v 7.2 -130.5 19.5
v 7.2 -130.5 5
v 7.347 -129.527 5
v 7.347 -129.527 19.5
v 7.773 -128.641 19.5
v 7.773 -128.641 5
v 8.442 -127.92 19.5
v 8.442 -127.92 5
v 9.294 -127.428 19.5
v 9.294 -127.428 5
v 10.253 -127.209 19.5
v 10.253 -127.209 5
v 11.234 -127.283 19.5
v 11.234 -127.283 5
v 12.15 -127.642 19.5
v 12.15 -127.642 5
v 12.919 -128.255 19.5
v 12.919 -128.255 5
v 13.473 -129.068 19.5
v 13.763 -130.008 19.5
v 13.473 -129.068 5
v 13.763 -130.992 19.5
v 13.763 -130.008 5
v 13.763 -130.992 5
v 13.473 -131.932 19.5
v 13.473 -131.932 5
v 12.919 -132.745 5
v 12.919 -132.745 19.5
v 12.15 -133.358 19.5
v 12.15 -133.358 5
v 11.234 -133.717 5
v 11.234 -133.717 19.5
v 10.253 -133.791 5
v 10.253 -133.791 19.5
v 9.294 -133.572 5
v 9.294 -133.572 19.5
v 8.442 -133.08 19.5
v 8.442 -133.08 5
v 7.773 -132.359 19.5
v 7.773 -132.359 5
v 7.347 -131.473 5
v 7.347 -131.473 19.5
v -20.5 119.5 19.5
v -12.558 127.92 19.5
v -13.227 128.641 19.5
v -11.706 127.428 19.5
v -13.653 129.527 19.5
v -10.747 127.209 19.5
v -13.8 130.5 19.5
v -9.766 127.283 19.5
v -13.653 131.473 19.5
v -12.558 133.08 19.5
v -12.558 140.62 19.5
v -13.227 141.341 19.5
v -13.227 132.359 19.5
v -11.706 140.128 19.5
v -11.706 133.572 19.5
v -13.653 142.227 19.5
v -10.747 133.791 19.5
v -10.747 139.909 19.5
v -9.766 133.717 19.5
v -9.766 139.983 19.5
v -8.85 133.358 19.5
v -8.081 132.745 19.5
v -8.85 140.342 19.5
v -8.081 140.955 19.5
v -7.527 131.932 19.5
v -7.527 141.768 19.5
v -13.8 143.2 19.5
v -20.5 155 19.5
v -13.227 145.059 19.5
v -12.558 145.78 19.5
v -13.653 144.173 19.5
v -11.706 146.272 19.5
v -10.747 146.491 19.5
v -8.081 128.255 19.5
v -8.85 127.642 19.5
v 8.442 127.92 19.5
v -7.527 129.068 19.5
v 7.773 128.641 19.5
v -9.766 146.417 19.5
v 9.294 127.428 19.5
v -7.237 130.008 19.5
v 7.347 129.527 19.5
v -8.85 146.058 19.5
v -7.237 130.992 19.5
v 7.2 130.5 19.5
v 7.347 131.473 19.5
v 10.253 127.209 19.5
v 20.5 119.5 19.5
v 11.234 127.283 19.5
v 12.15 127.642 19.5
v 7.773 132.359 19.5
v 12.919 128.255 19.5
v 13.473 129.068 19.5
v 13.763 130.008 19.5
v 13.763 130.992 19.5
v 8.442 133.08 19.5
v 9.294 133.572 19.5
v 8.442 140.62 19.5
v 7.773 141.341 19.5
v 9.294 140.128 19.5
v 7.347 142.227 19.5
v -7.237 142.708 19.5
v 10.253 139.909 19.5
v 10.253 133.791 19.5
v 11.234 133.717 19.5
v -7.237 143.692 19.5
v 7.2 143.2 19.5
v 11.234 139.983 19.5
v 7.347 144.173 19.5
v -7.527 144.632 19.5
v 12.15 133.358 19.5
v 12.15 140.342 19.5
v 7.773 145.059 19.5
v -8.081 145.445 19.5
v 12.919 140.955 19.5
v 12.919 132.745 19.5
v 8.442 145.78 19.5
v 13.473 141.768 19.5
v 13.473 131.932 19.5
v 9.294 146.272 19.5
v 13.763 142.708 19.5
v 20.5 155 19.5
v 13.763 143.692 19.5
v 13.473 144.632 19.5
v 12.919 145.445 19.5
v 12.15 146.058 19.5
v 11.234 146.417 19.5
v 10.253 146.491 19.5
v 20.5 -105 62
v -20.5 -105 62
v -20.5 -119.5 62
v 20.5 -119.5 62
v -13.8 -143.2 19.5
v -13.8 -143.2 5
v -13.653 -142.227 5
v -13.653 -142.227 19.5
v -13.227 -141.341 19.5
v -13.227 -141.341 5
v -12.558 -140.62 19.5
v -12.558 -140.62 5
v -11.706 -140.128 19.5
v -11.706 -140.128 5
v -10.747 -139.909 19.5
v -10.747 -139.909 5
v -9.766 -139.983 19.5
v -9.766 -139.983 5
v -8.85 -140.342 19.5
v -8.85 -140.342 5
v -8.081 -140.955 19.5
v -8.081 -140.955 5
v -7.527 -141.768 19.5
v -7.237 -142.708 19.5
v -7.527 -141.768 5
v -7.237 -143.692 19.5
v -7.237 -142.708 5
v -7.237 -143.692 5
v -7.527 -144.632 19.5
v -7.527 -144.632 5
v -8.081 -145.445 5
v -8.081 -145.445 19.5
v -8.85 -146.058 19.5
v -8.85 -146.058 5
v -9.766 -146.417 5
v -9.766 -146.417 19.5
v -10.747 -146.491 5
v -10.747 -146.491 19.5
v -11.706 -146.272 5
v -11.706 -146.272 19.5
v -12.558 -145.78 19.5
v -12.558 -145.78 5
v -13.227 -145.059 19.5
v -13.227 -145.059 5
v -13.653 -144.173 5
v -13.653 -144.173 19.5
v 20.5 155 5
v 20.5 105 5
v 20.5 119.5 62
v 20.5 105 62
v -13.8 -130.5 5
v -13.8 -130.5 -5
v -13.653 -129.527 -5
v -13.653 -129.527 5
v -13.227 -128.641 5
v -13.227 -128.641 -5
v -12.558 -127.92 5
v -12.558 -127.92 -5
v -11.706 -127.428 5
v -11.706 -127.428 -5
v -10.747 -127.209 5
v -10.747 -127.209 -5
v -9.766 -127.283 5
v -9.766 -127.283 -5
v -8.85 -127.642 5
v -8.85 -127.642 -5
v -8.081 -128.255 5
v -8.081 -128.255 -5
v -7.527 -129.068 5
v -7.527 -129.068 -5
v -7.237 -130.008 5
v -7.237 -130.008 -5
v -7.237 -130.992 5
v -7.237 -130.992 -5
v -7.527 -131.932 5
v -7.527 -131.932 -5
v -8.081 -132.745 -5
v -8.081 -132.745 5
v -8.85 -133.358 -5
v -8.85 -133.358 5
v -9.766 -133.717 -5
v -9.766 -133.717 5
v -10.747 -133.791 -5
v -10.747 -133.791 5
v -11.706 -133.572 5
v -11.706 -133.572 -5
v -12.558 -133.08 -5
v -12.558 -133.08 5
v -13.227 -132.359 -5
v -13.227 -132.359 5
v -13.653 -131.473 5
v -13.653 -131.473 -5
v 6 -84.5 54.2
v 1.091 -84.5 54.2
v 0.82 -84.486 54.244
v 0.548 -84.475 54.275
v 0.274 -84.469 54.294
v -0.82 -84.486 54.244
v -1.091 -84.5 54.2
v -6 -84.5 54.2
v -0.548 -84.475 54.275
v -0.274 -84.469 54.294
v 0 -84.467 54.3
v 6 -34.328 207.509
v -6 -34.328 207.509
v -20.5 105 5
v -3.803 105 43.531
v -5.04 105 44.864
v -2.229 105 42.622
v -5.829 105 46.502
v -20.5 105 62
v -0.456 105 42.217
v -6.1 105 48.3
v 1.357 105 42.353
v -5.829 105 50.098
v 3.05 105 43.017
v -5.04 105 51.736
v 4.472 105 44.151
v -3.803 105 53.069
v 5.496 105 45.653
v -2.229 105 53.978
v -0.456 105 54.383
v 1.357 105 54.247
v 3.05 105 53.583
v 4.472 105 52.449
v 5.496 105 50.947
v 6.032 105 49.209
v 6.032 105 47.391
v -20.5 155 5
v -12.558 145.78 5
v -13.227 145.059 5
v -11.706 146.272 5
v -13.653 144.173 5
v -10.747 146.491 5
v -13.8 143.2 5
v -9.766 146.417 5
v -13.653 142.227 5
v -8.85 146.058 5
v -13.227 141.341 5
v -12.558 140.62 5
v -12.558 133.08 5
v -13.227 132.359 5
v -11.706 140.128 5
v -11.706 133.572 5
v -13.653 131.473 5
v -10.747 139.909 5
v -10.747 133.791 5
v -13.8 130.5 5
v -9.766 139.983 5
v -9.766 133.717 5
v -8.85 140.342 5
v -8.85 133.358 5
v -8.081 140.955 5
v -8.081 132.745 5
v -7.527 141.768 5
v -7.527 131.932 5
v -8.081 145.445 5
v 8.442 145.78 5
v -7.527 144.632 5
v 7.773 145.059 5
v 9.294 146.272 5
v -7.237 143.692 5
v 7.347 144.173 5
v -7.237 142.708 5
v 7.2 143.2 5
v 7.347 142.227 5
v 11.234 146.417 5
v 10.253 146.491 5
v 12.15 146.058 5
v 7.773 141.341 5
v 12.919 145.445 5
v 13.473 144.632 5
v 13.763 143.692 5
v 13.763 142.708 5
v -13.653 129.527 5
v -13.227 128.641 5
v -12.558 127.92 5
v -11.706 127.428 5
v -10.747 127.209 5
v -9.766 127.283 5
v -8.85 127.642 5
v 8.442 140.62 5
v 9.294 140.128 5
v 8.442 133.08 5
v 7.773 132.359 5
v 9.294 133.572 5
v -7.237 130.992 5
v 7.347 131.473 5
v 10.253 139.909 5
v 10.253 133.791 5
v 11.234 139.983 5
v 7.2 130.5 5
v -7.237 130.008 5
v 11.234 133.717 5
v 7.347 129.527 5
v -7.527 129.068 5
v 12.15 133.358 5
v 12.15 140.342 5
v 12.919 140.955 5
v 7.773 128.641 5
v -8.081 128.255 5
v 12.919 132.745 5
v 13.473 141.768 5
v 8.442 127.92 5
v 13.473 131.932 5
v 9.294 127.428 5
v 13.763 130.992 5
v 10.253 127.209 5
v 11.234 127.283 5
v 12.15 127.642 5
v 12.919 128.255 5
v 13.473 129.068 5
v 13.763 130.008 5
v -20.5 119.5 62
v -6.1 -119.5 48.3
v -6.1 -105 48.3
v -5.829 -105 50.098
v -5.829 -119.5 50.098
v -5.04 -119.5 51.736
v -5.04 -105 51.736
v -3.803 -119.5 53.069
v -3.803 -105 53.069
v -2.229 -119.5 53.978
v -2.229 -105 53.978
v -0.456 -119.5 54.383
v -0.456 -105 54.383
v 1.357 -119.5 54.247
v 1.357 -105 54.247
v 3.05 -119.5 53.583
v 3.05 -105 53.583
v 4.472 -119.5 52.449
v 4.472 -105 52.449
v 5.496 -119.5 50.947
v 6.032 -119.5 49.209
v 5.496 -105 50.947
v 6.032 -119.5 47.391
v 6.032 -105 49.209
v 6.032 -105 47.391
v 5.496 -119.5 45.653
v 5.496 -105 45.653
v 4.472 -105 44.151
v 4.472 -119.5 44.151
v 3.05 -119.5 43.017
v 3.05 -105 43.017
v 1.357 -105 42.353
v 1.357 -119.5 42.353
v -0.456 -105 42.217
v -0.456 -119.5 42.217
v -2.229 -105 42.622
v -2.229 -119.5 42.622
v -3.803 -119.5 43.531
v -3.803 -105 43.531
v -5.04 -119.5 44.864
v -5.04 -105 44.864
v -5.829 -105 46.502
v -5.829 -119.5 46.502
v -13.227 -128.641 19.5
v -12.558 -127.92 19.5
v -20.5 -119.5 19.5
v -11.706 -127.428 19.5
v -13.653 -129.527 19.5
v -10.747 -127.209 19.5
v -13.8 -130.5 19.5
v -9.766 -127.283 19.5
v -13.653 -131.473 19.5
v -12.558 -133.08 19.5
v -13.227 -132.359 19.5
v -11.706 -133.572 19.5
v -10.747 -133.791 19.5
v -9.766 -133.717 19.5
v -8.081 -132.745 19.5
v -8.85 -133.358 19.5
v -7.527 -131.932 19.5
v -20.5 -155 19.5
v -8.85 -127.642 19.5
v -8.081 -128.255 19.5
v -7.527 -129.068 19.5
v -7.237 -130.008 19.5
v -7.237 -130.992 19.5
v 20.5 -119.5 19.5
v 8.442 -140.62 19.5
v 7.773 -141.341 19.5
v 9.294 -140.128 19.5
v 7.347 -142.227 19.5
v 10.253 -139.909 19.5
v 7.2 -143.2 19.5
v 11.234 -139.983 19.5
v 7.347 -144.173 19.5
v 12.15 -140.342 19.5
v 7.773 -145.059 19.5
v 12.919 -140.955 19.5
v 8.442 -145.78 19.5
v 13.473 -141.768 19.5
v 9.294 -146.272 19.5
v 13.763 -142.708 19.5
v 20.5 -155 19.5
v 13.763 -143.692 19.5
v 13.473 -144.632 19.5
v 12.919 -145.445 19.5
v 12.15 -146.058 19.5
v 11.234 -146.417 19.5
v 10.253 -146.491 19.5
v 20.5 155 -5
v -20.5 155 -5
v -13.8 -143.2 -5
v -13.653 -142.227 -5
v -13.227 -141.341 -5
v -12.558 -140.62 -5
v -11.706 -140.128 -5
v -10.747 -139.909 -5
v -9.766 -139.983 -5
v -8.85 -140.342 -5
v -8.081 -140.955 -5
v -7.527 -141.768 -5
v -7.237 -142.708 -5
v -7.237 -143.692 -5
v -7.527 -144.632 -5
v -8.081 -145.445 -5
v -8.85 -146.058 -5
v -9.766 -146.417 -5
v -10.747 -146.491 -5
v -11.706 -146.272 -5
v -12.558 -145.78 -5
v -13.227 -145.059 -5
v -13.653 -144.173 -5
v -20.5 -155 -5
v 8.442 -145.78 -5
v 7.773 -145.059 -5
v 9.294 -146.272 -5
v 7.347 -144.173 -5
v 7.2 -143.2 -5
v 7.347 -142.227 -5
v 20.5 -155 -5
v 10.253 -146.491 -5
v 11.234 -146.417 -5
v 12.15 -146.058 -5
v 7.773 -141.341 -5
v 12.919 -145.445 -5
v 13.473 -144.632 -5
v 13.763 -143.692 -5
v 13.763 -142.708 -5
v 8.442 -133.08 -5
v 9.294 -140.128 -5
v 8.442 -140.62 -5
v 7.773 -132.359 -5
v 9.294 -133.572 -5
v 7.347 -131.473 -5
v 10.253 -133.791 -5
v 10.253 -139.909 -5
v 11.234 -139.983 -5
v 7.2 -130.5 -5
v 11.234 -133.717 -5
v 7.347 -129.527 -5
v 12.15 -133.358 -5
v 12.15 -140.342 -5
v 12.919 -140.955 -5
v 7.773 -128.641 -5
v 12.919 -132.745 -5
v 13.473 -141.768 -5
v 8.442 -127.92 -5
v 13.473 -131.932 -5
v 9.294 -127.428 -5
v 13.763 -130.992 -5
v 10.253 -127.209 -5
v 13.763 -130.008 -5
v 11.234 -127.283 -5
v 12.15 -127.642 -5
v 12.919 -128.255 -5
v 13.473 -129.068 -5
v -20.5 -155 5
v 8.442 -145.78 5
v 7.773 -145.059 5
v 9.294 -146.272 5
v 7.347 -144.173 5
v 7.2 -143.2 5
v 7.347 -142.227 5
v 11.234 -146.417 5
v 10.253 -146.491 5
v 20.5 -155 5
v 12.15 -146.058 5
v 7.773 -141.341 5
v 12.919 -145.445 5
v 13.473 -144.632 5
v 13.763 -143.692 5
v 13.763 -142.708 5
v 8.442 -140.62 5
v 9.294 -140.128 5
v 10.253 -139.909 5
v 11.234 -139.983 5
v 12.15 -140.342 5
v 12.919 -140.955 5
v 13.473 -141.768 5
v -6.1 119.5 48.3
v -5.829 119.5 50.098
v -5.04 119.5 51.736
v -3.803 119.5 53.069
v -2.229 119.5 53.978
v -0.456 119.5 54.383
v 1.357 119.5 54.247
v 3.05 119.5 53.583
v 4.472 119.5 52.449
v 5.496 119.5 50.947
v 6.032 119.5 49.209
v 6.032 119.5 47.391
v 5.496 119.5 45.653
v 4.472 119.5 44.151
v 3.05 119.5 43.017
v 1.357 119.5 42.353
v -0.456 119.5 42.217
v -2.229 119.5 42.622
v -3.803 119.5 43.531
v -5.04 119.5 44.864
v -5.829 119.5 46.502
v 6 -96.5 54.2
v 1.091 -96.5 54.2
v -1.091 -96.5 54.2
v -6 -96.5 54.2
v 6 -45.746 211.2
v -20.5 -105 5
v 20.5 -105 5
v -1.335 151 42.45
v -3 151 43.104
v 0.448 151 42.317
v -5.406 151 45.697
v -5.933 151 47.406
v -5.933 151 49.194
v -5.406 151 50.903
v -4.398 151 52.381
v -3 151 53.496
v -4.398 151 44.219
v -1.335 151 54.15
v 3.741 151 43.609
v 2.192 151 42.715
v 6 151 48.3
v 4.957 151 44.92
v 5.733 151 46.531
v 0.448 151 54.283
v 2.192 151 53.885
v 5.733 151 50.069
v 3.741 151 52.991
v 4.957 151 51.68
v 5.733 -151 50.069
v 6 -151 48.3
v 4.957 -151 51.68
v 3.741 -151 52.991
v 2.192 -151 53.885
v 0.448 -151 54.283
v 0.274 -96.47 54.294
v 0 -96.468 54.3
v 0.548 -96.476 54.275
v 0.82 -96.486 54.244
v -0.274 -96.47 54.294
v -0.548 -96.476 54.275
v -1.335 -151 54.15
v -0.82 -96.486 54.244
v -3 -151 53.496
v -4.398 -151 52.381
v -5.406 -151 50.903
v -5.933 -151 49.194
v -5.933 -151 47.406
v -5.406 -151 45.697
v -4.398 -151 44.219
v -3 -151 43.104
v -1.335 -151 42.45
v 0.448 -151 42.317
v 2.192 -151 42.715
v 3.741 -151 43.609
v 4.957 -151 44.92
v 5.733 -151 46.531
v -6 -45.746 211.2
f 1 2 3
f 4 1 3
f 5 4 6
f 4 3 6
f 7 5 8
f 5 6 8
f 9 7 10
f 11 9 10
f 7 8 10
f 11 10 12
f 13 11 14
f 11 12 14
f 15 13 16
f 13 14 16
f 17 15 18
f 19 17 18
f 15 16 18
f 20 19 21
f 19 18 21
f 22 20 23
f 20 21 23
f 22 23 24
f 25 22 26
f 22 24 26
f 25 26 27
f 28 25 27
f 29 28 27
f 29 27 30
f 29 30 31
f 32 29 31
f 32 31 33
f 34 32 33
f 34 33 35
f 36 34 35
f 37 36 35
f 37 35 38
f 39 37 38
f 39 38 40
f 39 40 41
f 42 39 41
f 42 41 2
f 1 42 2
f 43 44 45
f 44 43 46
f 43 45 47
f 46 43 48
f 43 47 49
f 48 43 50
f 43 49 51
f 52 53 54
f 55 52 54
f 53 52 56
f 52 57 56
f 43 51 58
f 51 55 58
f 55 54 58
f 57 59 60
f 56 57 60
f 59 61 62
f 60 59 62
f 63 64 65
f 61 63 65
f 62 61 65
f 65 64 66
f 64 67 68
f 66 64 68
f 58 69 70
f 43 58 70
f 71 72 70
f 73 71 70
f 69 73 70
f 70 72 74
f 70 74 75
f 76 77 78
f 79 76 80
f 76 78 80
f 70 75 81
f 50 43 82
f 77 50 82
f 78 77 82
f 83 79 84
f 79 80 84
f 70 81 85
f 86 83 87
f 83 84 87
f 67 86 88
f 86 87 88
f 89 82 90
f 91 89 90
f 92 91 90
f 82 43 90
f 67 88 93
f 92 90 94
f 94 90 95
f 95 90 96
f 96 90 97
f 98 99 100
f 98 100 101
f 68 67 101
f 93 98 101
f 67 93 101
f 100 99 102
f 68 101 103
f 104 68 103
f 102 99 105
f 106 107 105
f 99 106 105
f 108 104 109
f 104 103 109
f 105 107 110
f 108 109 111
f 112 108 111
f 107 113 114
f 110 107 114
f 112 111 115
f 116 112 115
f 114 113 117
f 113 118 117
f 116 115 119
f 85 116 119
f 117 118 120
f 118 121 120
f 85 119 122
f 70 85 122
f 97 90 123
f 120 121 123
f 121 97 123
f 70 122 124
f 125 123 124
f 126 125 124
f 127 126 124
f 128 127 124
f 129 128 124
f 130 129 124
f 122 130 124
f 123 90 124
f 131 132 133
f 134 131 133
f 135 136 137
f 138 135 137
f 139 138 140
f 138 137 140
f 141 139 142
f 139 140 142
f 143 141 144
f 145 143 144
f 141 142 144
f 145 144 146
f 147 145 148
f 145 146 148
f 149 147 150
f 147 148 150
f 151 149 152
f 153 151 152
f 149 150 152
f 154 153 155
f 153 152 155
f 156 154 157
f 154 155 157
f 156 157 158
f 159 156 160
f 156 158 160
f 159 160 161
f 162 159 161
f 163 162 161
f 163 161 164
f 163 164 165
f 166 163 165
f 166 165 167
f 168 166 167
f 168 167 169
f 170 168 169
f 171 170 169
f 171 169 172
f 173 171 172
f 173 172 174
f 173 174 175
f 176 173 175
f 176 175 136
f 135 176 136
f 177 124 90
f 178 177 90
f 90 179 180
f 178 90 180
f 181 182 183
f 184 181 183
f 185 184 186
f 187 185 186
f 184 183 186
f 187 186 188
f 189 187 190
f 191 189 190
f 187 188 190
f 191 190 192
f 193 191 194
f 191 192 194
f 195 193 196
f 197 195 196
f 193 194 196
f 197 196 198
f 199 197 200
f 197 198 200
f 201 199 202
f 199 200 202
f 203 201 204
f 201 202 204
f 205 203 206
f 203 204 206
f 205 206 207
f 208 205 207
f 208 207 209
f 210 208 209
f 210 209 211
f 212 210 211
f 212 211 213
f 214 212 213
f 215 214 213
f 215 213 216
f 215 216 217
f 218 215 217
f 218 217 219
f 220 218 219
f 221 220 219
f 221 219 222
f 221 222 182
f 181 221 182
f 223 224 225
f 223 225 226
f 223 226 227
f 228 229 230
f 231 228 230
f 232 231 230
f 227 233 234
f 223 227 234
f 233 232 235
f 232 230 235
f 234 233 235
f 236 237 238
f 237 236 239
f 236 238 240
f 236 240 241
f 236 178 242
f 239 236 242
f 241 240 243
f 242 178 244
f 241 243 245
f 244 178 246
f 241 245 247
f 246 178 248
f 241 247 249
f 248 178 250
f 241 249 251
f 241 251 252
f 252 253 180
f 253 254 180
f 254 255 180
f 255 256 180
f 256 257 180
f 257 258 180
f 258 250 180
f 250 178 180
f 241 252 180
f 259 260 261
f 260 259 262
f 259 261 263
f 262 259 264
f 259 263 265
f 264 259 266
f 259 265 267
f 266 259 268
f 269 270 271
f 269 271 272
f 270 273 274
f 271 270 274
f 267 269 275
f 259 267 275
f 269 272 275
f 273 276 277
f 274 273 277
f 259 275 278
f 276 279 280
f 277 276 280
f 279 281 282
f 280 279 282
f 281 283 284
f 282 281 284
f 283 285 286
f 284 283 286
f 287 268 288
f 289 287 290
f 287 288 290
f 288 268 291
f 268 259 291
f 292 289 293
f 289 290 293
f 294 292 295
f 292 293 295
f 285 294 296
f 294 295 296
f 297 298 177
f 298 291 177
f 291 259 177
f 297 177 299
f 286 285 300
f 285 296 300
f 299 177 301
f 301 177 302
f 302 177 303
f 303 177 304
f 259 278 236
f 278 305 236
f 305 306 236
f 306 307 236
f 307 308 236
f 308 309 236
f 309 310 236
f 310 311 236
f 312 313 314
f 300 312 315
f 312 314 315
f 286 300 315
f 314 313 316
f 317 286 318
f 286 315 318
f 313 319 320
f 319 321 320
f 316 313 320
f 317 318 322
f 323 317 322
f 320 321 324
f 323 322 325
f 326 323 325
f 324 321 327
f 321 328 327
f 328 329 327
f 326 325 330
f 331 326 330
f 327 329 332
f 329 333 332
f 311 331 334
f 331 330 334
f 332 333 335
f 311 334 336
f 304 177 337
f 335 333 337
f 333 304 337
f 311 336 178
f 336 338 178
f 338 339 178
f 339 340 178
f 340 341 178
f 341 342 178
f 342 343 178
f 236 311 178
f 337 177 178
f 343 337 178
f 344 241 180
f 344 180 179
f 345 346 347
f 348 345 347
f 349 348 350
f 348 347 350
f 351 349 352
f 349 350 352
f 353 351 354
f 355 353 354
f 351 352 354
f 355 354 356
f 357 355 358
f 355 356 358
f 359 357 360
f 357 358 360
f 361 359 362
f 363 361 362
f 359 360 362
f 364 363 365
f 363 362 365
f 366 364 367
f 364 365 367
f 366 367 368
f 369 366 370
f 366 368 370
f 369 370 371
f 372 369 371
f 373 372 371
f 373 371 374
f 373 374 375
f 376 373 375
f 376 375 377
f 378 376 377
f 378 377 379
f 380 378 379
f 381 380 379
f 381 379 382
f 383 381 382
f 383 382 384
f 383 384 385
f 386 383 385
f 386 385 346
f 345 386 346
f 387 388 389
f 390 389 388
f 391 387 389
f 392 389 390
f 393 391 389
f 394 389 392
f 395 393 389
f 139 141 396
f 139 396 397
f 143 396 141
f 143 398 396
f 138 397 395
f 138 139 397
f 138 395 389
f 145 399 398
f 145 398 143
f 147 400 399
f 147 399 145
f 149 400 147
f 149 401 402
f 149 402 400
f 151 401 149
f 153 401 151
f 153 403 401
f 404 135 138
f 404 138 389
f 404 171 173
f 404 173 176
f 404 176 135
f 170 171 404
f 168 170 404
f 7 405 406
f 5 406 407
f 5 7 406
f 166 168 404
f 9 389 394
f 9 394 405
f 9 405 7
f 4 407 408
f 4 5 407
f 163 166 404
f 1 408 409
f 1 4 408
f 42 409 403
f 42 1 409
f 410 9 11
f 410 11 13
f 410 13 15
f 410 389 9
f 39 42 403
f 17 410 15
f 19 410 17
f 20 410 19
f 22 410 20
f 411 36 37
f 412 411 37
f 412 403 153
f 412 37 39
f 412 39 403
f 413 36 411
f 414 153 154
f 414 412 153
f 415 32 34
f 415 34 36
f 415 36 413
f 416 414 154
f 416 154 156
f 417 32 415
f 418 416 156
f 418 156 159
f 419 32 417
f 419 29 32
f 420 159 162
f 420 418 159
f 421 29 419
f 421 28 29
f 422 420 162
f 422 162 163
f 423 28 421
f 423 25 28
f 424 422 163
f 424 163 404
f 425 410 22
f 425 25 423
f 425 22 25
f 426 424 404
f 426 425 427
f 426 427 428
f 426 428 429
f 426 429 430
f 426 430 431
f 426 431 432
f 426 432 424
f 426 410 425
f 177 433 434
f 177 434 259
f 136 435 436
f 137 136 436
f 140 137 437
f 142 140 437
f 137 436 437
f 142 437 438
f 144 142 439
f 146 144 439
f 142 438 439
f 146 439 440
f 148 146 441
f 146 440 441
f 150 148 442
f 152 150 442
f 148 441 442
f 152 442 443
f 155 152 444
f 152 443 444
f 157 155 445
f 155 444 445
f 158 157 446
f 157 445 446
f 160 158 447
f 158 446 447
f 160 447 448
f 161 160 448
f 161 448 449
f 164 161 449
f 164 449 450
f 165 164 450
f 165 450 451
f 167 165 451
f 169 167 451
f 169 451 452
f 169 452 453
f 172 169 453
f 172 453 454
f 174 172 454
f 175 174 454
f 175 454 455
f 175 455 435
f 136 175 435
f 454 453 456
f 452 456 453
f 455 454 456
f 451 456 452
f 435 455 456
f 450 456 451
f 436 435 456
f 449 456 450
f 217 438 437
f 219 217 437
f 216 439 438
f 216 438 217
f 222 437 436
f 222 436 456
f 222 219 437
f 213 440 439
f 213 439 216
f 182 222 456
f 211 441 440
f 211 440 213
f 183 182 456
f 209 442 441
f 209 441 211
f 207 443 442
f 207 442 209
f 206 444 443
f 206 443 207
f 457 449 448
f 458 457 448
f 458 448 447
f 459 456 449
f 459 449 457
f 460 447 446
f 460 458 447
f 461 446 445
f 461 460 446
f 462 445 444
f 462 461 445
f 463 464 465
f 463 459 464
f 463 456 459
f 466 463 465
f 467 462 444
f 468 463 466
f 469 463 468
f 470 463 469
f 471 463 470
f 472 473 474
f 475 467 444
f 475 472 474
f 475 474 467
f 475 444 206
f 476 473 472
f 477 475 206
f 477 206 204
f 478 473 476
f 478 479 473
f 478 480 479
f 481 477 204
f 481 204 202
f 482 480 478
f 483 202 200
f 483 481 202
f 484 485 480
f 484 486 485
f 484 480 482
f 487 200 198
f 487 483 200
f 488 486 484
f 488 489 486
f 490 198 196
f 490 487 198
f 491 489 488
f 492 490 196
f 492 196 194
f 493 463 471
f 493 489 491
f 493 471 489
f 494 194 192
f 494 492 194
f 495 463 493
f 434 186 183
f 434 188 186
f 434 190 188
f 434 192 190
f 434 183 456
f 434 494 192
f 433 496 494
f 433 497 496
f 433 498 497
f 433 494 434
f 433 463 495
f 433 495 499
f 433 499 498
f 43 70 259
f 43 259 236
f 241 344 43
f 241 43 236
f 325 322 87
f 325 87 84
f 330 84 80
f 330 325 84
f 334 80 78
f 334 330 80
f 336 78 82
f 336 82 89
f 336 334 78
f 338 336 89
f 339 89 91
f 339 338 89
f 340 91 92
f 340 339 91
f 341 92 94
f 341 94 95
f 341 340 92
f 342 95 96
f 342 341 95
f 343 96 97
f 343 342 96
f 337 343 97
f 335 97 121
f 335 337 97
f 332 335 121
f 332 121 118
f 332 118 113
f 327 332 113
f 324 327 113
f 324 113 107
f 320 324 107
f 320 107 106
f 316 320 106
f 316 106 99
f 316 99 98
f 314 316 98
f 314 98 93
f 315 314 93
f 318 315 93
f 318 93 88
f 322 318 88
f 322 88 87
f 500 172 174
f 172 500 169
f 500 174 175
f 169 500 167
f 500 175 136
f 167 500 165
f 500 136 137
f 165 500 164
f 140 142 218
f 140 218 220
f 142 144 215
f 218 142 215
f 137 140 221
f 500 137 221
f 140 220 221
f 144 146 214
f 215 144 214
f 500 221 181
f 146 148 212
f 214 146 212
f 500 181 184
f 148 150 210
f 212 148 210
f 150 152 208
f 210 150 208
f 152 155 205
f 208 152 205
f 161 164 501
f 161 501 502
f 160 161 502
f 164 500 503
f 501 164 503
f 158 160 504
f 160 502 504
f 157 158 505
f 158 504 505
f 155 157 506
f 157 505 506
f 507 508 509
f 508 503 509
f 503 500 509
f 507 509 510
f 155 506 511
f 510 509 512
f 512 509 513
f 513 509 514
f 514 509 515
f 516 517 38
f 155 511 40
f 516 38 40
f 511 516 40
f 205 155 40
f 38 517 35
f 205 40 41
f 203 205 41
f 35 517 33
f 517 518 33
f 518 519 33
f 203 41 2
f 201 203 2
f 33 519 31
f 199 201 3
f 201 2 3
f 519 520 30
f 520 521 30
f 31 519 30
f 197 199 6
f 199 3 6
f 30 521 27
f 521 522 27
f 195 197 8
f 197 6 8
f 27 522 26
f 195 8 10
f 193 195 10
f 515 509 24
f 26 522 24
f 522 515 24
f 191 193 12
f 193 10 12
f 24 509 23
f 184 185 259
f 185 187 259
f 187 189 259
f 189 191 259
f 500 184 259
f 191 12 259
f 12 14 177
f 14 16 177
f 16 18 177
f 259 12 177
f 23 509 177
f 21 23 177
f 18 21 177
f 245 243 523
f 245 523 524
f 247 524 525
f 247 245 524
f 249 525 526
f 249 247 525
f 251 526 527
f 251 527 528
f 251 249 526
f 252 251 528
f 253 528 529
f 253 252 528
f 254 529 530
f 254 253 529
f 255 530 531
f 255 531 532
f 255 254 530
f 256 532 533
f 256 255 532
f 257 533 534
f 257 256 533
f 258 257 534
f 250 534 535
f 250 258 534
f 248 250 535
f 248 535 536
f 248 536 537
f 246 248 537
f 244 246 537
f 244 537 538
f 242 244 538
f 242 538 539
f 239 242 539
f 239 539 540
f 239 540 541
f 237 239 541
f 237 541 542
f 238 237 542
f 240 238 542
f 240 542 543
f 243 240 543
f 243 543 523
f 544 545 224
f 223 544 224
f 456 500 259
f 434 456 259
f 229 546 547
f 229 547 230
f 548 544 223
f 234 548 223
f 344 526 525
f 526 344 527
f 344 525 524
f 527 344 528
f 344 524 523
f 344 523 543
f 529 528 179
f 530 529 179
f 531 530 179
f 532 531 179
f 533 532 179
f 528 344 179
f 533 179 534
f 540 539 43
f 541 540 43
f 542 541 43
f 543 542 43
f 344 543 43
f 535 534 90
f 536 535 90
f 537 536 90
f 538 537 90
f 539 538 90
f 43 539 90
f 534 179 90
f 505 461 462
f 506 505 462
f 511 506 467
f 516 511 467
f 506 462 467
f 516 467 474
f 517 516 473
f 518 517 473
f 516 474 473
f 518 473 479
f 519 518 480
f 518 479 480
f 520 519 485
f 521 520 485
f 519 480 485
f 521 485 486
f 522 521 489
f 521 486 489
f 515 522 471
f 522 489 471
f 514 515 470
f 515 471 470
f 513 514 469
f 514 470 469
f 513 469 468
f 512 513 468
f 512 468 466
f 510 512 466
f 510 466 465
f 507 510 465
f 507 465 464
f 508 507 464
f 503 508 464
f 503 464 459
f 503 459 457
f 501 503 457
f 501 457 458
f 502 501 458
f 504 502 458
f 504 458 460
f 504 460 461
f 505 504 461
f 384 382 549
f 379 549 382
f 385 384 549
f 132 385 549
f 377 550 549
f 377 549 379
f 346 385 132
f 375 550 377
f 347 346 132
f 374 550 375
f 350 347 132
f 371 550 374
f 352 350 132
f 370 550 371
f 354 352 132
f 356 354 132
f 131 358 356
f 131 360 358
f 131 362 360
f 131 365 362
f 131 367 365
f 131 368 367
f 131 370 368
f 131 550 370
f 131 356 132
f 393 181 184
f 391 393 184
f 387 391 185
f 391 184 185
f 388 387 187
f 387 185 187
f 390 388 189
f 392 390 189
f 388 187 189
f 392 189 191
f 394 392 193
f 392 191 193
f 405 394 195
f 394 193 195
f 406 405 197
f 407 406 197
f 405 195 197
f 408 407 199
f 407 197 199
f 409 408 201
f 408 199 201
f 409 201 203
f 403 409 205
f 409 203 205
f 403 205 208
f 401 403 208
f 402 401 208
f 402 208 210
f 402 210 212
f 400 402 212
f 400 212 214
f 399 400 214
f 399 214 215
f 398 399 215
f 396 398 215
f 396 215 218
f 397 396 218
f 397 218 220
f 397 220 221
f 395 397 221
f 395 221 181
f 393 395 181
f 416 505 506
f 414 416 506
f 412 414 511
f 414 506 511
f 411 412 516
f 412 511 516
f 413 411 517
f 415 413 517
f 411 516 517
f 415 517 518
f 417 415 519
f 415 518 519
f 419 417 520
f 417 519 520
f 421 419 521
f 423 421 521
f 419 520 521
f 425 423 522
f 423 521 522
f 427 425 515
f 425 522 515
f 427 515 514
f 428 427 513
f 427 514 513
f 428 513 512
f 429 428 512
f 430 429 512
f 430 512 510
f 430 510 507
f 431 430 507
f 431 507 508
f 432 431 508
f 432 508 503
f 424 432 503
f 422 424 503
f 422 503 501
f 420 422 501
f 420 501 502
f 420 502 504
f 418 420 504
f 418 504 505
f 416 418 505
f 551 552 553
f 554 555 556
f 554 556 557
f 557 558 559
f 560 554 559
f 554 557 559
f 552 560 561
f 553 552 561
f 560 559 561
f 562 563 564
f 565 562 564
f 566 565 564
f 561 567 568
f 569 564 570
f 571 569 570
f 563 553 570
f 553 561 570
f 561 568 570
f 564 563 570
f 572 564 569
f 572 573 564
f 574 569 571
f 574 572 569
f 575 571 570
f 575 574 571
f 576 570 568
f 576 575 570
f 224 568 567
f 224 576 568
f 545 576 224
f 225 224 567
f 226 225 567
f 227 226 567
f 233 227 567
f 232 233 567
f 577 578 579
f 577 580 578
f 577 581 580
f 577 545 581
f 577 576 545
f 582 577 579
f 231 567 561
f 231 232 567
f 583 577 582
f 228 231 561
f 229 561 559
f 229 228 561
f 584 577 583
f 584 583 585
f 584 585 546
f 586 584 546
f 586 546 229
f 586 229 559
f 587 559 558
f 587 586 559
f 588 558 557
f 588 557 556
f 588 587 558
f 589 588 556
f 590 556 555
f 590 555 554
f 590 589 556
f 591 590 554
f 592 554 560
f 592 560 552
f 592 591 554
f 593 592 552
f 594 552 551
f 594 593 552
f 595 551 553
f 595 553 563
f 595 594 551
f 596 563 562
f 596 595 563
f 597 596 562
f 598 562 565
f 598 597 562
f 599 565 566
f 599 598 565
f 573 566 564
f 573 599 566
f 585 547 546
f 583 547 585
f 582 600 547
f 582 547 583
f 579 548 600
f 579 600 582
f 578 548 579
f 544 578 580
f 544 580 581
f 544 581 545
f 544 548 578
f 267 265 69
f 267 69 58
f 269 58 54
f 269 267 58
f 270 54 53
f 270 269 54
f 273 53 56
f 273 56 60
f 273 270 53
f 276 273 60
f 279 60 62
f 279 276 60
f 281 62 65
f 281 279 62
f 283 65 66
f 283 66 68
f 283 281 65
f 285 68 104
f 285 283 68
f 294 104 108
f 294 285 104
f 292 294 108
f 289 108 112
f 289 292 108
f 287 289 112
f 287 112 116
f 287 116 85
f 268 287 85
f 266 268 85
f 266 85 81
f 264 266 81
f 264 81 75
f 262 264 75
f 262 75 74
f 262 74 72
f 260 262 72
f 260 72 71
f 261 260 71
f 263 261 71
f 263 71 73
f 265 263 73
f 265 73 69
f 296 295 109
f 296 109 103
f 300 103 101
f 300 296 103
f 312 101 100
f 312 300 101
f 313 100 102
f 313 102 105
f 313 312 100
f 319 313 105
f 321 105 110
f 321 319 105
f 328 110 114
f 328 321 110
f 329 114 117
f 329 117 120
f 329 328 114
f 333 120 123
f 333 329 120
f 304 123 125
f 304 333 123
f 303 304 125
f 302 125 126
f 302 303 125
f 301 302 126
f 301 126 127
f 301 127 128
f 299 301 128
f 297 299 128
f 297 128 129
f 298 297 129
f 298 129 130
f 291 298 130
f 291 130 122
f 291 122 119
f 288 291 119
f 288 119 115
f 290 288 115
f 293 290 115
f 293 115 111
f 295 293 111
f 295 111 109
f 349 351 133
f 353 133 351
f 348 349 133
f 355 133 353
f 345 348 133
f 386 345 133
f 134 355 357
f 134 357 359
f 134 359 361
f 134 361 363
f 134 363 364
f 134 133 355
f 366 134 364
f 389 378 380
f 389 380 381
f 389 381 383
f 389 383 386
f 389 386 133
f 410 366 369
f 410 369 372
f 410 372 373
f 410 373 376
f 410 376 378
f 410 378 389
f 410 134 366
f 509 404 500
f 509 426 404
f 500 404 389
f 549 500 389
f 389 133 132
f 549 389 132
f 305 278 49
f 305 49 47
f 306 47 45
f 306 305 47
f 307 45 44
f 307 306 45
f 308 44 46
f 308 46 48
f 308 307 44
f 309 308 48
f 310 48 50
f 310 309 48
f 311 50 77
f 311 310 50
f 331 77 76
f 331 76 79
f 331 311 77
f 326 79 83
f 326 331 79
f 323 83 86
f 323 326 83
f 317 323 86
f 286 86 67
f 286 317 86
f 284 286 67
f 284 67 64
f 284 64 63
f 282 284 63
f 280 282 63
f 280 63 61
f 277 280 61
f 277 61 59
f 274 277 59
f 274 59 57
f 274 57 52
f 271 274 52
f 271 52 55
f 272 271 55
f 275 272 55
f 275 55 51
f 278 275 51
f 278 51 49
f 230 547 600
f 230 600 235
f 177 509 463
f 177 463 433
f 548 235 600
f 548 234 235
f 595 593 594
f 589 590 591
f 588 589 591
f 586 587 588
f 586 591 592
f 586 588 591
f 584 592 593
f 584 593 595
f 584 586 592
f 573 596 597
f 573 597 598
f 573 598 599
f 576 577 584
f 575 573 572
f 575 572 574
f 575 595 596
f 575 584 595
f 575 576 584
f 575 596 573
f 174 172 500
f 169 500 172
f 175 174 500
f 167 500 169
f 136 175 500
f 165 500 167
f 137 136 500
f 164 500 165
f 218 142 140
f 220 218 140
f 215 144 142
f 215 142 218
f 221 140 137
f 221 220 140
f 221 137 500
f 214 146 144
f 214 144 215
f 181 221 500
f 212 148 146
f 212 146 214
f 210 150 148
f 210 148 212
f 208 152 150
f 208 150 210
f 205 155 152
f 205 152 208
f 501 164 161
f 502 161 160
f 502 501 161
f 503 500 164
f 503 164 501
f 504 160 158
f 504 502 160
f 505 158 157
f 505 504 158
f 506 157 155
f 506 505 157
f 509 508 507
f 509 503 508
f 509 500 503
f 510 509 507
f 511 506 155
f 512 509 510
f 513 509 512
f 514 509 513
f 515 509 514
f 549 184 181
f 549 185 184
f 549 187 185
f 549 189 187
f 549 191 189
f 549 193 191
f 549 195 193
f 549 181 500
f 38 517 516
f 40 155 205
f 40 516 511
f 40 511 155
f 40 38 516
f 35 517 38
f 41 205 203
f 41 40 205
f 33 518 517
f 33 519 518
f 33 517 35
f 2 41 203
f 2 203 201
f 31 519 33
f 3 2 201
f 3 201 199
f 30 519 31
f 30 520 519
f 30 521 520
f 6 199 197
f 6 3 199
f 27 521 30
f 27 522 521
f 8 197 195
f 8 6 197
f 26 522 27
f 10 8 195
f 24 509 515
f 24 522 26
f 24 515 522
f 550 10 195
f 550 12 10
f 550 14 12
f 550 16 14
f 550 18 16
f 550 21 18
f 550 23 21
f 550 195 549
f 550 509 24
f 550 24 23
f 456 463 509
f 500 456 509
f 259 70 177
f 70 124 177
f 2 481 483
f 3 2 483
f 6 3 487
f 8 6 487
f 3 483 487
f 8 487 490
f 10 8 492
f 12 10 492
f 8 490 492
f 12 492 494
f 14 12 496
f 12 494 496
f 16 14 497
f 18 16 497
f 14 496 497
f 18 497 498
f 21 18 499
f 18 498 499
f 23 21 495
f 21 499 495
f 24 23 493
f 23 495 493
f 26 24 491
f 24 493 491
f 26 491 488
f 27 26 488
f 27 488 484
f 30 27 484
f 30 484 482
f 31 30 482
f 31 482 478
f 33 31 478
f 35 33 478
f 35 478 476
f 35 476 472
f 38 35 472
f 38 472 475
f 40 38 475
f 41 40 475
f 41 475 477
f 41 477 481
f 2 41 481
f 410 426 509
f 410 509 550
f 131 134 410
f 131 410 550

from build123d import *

# Parameters (mm, degrees)
F0_W           = 310
F0_H           = 10
F1_DEPTH       = 20.5
F1_DEPTH_BACK  = 20.5
F3_DEPTH       = 20.5
F3_DEPTH_BACK  = 20.5
F5_D           = 6.6
F5_2_D         = 6.6
F6_R           = 6.1
F7_DEPTH       = 25
F9_R           = 6
F10_DEPTH      = 151
F10_DEPTH_BACK = 151
F12_DEPTH      = 6
F12_DEPTH_BACK = 6


# Not quite as in the source:
# - a feature of the source that left no trace in its solid (it failed there, or was rolled back) is left out


with BuildPart() as f1:
    # F0 (on Right) → F1 (new body, two sides)
    with BuildSketch(Plane.YZ) as f1_sk:
        Rectangle(F0_W, F0_H)
    extrude(amount=F1_DEPTH)
    extrude(f1_sk.sketch, amount=-F1_DEPTH_BACK)

    # F5 (through all)
    with Locations(Plane.XY.offset(19.5)):
        with Locations((10.5, -143.2), (-10.5, -143.2), (-10.5, -130.5), (10.5, -130.5)):
            Hole(F5_D / 2)


with BuildPart() as f3:
    # F2 (on Right) → F3 (new body, two sides)
    with BuildSketch(Plane.YZ) as f3_sk:
        Polygon((-155, 19.5), (-155, 5), (-105, 5), (-105, 62), (-119.5, 62), (-119.5, 19.5), align=None)
    extrude(amount=F3_DEPTH)
    extrude(f3_sk.sketch, amount=-F3_DEPTH_BACK)

    # F5#2 (through all)
    with Locations(Plane.XY.offset(19.5)):
        with Locations((10.5, -143.2), (-10.5, -143.2), (-10.5, -130.5), (10.5, -130.5)):
            Hole(F5_2_D / 2)

    # F6 (on face) → F7 (cut)
    with BuildSketch(Plane(origin=(0, -105, 0), x_dir=(-1, 0, 0), z_dir=(0, 1, 0))):
        with Locations((0, 48.3)):
            Circle(F6_R)
    extrude(amount=-F7_DEPTH, mode=Mode.SUBTRACT)


with BuildPart() as f8_1:
    # F8: instance of F3
    add(f3.part.mirror(Plane.XZ))


with BuildPart() as f10:
    # F9 (on Front) → F10 (new body, two sides)
    with BuildSketch(Plane.XZ) as f10_sk:
        with Locations((0, 48.3)):
            Circle(F9_R)
    extrude(amount=F10_DEPTH)
    extrude(f10_sk.sketch, amount=-F10_DEPTH_BACK)

    # F11 (on Right) → F12 (join, two sides)
    with BuildSketch(Plane.YZ) as f12_sk:
        Polygon((-45.7456898382, 211.2), (-96.5, 54.2), (-84.5, 54.2), (-34.32750802, 207.5087774428), align=None)
    extrude(amount=F12_DEPTH)
    extrude(f12_sk.sketch, amount=-F12_DEPTH_BACK)


solid = Compound([f1.part, f3.part, f8_1.part, f10.part])
